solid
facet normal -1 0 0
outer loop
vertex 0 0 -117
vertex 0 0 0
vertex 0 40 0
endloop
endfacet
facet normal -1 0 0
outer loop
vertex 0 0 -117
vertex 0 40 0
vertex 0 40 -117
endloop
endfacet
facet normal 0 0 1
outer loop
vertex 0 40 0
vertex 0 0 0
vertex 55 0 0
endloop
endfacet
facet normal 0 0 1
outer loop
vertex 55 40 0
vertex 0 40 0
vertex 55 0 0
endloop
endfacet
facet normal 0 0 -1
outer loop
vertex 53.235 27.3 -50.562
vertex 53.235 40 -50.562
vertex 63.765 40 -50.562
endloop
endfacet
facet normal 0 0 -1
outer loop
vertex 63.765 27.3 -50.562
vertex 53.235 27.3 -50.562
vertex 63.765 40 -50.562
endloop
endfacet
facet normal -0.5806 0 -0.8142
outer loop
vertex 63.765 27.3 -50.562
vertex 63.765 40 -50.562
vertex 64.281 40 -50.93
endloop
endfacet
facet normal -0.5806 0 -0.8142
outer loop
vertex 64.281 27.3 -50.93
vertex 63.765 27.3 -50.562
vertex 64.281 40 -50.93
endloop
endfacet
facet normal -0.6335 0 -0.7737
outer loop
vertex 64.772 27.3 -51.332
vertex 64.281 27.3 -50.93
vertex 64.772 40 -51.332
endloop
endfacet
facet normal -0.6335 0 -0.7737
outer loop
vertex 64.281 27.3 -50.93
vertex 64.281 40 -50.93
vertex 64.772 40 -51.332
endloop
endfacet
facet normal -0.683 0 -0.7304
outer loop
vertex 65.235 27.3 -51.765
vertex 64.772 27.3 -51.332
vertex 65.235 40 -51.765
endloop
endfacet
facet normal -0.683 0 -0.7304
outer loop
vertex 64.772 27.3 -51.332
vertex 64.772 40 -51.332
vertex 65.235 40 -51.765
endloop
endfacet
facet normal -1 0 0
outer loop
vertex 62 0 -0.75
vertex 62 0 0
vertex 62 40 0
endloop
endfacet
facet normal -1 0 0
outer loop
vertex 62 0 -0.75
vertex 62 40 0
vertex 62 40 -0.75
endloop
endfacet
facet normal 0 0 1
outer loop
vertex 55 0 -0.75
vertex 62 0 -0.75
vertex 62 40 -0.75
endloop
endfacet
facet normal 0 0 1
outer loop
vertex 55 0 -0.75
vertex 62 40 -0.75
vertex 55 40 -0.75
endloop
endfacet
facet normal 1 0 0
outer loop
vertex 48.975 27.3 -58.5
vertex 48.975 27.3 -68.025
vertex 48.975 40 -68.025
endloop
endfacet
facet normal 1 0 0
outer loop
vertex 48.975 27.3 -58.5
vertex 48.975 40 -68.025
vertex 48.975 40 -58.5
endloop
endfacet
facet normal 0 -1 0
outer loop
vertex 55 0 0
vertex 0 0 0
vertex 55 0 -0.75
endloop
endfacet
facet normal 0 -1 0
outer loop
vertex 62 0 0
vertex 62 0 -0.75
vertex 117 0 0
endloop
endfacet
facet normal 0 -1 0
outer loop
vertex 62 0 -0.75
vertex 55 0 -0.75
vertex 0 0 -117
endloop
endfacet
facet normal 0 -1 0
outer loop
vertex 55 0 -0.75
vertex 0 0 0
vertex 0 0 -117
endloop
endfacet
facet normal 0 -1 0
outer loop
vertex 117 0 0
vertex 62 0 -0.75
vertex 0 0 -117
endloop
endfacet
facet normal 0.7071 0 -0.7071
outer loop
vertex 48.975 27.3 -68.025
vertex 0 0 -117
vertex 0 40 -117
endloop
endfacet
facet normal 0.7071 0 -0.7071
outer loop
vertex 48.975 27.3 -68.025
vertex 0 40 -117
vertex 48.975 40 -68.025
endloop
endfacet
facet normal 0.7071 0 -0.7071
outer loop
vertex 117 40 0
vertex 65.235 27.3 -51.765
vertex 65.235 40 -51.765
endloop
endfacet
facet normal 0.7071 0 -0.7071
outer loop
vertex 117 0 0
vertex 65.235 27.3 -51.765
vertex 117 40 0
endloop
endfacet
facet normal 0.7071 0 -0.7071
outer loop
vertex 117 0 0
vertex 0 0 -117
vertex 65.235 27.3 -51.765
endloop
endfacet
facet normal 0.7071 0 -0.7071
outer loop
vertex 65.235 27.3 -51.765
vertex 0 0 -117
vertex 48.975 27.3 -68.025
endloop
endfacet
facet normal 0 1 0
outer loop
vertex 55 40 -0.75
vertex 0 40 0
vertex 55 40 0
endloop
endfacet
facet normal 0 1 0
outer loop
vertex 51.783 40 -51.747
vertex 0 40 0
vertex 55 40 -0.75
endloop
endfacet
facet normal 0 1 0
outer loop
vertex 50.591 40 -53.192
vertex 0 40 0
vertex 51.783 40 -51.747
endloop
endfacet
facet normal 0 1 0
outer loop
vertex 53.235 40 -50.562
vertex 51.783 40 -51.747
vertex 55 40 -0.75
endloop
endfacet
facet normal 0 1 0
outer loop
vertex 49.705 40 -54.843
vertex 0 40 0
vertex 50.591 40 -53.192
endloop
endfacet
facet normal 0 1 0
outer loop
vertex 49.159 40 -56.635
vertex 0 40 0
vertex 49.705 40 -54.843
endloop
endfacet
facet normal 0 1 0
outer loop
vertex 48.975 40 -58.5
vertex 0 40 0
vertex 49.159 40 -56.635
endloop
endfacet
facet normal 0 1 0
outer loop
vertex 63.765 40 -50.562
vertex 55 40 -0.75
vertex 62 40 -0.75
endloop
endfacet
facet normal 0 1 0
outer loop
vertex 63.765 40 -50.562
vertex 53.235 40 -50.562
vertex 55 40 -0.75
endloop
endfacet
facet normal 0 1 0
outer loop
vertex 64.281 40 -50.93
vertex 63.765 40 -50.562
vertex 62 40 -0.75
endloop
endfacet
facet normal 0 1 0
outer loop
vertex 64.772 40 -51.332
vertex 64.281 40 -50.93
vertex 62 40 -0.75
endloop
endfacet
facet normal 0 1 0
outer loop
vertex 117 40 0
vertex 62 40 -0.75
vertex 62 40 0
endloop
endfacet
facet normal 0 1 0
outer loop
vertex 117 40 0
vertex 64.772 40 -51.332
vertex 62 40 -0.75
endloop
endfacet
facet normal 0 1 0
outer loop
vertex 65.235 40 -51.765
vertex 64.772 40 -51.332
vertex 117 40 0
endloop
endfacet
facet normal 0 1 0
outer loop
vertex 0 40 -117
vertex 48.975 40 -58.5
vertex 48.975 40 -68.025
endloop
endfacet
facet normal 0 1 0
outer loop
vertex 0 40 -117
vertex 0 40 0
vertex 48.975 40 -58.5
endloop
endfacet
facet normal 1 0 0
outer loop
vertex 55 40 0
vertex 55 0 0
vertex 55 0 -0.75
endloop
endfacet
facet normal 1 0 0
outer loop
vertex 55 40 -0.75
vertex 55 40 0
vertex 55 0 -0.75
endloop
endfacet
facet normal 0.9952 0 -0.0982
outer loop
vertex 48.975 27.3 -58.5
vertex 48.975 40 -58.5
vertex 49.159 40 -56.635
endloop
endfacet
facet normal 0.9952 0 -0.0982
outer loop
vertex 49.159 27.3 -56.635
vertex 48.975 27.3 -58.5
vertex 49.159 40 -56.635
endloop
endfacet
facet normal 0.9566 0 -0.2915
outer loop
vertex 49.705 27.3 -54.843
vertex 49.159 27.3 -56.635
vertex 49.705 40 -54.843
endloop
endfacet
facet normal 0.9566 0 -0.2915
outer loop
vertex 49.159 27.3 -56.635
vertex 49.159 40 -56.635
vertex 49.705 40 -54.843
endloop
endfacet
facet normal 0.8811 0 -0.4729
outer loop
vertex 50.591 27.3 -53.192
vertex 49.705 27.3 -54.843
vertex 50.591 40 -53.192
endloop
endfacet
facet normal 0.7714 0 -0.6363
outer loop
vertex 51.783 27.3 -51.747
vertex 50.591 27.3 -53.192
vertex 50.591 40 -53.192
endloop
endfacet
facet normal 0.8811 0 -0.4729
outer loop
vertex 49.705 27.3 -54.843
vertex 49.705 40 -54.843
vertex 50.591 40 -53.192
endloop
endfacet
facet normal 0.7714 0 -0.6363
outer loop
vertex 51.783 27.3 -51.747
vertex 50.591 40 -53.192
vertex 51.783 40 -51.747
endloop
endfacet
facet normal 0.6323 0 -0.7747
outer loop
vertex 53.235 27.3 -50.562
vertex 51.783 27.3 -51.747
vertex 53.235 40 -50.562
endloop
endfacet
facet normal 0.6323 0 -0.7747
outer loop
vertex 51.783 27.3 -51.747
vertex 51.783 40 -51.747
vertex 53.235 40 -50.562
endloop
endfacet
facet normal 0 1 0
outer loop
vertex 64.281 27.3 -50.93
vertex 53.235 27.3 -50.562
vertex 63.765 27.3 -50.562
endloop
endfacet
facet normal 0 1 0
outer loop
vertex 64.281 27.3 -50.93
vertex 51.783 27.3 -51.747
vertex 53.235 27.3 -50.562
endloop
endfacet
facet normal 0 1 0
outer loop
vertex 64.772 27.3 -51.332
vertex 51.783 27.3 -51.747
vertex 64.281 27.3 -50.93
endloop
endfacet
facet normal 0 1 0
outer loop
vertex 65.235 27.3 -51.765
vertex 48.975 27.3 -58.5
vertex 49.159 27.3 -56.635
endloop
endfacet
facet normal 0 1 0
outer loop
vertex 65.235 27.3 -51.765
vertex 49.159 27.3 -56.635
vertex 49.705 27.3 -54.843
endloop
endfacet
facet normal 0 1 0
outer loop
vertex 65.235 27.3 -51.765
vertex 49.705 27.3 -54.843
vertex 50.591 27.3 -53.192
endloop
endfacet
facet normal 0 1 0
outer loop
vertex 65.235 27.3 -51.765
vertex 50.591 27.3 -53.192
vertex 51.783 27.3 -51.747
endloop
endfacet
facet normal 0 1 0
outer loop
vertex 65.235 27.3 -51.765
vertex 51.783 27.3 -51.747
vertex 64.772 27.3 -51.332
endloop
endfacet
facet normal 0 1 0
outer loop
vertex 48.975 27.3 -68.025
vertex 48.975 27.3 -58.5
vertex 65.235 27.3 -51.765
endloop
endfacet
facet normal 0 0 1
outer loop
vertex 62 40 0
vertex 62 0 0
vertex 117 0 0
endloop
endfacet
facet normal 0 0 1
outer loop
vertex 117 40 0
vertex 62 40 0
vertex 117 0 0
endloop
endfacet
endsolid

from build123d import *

# Parameters (mm, degrees)
SKETCH1_W           = 117
SKETCH1_H           = 117
BOSS_EXTRUDE1_DEPTH = 40
SKETCH2_W           = 10.53028371
SKETCH2_H           = 7.9375
CUT_EXTRUDE1_DEPTH  = 12.7
SKETCH7_W           = 7
SKETCH7_H           = 1.5
CUT_EXTRUDE5_DEPTH  = 171.22925718
CIRPATTERN3_COUNT   = 3
CIRPATTERN3_ANGLE   = 180
CUT_EXTRUDE11_DEPTH = 171.22925718


with BuildPart() as part:
    # Sketch1 → Boss-Extrude1 (new body)
    with BuildSketch(Plane(origin=(0, 0, 0), x_dir=(1, 0, 0), z_dir=(0, 1, 0))):
        with Locations((58.5, 58.5)):
            Rectangle(SKETCH1_W, SKETCH1_H)
    extrude(amount=BOSS_EXTRUDE1_DEPTH)

    # Sketch2 → Cut-Extrude1 (cut)
    with BuildSketch(Plane(origin=(0, 40, 0), x_dir=(1, 0, 0), z_dir=(0, 1, 0))):
        with BuildLine():
            ThreePointArc((63.765141855, 66.4375), (66.892737967, 63.004173), (68.025, 58.5))
            Line((68.025, 58.5), (68.025, 74.375))
            Line((68.025, 74.375), (48.975, 74.375))
            Line((48.975, 74.375), (48.975, 58.5))
            ThreePointArc((48.975, 58.5), (50.107262033, 63.004173), (53.234858145, 66.4375))
            ThreePointArc((53.234858145, 66.4375), (58.5, 68.025), (63.765141855, 66.4375))
        make_face()
        with BuildLine():
            ThreePointArc((63.765141855, 50.5625), (66.892737967, 53.995827), (68.025, 58.5))
            Line((68.025, 58.5), (63.765141855, 58.5))
            Line((63.765141855, 58.5), (63.765141855, 50.5625))
        make_face()
        with BuildLine():
            Line((63.765141855, 58.5), (68.025, 58.5))
            ThreePointArc((68.025, 58.5), (66.892737967, 63.004173), (63.765141855, 66.4375))
            Line((63.765141855, 66.4375), (63.765141855, 58.5))
        make_face()
        with BuildLine():
            Line((53.234858145, 50.5625), (53.234858145, 58.5))
            Line((53.234858145, 58.5), (48.975, 58.5))
            ThreePointArc((48.975, 58.5), (50.107262033, 53.995827), (53.234858145, 50.5625))
        make_face()
        with BuildLine():
            Line((48.975, 58.5), (53.234858145, 58.5))
            Line((53.234858145, 58.5), (53.234858145, 66.4375))
            ThreePointArc((53.234858145, 66.4375), (50.107262033, 63.004173), (48.975, 58.5))
        make_face()
        with Locations((58.5, 62.46875)):
            Rectangle(SKETCH2_W, SKETCH2_H)
        with BuildLine():
            Line((53.234858145, 66.4375), (63.765141855, 66.4375))
            ThreePointArc((63.765141855, 66.4375), (58.5, 68.025), (53.234858145, 66.4375))
        make_face()
        with BuildLine():
            ThreePointArc((63.765141855, 50.5625), (66.892737967, 53.995827), (68.025, 58.5))
            Line((68.025, 58.5), (63.765141855, 58.5))
            Line((63.765141855, 58.5), (63.765141855, 50.5625))
        make_face()
        with BuildLine():
            Line((63.765141855, 58.5), (68.025, 58.5))
            ThreePointArc((68.025, 58.5), (66.892737967, 63.004173), (63.765141855, 66.4375))
            Line((63.765141855, 66.4375), (63.765141855, 58.5))
        make_face()
        with BuildLine():
            Line((53.234858145, 50.5625), (53.234858145, 58.5))
            Line((53.234858145, 58.5), (48.975, 58.5))
            ThreePointArc((48.975, 58.5), (50.107262033, 53.995827), (53.234858145, 50.5625))
        make_face()
        with BuildLine():
            Line((48.975, 58.5), (53.234858145, 58.5))
            Line((53.234858145, 58.5), (53.234858145, 66.4375))
            ThreePointArc((53.234858145, 66.4375), (50.107262033, 63.004173), (48.975, 58.5))
        make_face()
        with Locations((58.5, 54.53125)):
            Rectangle(SKETCH2_W, SKETCH2_H)
    extrude(amount=-CUT_EXTRUDE1_DEPTH, mode=Mode.SUBTRACT)

    # Sketch7 → Cut-Extrude5 (cut, through all)
    with BuildSketch(Plane.XZ):
        with Locations((58.5, -117)):
            Rectangle(SKETCH7_W, SKETCH7_H)
    cut_extrude5 = extrude(amount=-CUT_EXTRUDE5_DEPTH, mode=Mode.SUBTRACT)

    # CirPattern3: Cut-Extrude5 ×3 about axis
    cirpattern3_axis = Axis((58.5, 0, -58.5), (0, -1, 0))
    for i in range(1, CIRPATTERN3_COUNT):
        add(cut_extrude5.rotate(cirpattern3_axis, i * CIRPATTERN3_ANGLE / (CIRPATTERN3_COUNT - 1)), mode=Mode.SUBTRACT)

    # Sketch11 → Cut-Extrude11 (cut, through all)
    with BuildSketch(Plane.XZ):
        Polygon((0, -117), (117, 0), (188.640274668, -71.640274668), (71.640274668, -188.640274668), align=None)
    extrude(amount=-CUT_EXTRUDE11_DEPTH, mode=Mode.SUBTRACT)


solid = part.part
